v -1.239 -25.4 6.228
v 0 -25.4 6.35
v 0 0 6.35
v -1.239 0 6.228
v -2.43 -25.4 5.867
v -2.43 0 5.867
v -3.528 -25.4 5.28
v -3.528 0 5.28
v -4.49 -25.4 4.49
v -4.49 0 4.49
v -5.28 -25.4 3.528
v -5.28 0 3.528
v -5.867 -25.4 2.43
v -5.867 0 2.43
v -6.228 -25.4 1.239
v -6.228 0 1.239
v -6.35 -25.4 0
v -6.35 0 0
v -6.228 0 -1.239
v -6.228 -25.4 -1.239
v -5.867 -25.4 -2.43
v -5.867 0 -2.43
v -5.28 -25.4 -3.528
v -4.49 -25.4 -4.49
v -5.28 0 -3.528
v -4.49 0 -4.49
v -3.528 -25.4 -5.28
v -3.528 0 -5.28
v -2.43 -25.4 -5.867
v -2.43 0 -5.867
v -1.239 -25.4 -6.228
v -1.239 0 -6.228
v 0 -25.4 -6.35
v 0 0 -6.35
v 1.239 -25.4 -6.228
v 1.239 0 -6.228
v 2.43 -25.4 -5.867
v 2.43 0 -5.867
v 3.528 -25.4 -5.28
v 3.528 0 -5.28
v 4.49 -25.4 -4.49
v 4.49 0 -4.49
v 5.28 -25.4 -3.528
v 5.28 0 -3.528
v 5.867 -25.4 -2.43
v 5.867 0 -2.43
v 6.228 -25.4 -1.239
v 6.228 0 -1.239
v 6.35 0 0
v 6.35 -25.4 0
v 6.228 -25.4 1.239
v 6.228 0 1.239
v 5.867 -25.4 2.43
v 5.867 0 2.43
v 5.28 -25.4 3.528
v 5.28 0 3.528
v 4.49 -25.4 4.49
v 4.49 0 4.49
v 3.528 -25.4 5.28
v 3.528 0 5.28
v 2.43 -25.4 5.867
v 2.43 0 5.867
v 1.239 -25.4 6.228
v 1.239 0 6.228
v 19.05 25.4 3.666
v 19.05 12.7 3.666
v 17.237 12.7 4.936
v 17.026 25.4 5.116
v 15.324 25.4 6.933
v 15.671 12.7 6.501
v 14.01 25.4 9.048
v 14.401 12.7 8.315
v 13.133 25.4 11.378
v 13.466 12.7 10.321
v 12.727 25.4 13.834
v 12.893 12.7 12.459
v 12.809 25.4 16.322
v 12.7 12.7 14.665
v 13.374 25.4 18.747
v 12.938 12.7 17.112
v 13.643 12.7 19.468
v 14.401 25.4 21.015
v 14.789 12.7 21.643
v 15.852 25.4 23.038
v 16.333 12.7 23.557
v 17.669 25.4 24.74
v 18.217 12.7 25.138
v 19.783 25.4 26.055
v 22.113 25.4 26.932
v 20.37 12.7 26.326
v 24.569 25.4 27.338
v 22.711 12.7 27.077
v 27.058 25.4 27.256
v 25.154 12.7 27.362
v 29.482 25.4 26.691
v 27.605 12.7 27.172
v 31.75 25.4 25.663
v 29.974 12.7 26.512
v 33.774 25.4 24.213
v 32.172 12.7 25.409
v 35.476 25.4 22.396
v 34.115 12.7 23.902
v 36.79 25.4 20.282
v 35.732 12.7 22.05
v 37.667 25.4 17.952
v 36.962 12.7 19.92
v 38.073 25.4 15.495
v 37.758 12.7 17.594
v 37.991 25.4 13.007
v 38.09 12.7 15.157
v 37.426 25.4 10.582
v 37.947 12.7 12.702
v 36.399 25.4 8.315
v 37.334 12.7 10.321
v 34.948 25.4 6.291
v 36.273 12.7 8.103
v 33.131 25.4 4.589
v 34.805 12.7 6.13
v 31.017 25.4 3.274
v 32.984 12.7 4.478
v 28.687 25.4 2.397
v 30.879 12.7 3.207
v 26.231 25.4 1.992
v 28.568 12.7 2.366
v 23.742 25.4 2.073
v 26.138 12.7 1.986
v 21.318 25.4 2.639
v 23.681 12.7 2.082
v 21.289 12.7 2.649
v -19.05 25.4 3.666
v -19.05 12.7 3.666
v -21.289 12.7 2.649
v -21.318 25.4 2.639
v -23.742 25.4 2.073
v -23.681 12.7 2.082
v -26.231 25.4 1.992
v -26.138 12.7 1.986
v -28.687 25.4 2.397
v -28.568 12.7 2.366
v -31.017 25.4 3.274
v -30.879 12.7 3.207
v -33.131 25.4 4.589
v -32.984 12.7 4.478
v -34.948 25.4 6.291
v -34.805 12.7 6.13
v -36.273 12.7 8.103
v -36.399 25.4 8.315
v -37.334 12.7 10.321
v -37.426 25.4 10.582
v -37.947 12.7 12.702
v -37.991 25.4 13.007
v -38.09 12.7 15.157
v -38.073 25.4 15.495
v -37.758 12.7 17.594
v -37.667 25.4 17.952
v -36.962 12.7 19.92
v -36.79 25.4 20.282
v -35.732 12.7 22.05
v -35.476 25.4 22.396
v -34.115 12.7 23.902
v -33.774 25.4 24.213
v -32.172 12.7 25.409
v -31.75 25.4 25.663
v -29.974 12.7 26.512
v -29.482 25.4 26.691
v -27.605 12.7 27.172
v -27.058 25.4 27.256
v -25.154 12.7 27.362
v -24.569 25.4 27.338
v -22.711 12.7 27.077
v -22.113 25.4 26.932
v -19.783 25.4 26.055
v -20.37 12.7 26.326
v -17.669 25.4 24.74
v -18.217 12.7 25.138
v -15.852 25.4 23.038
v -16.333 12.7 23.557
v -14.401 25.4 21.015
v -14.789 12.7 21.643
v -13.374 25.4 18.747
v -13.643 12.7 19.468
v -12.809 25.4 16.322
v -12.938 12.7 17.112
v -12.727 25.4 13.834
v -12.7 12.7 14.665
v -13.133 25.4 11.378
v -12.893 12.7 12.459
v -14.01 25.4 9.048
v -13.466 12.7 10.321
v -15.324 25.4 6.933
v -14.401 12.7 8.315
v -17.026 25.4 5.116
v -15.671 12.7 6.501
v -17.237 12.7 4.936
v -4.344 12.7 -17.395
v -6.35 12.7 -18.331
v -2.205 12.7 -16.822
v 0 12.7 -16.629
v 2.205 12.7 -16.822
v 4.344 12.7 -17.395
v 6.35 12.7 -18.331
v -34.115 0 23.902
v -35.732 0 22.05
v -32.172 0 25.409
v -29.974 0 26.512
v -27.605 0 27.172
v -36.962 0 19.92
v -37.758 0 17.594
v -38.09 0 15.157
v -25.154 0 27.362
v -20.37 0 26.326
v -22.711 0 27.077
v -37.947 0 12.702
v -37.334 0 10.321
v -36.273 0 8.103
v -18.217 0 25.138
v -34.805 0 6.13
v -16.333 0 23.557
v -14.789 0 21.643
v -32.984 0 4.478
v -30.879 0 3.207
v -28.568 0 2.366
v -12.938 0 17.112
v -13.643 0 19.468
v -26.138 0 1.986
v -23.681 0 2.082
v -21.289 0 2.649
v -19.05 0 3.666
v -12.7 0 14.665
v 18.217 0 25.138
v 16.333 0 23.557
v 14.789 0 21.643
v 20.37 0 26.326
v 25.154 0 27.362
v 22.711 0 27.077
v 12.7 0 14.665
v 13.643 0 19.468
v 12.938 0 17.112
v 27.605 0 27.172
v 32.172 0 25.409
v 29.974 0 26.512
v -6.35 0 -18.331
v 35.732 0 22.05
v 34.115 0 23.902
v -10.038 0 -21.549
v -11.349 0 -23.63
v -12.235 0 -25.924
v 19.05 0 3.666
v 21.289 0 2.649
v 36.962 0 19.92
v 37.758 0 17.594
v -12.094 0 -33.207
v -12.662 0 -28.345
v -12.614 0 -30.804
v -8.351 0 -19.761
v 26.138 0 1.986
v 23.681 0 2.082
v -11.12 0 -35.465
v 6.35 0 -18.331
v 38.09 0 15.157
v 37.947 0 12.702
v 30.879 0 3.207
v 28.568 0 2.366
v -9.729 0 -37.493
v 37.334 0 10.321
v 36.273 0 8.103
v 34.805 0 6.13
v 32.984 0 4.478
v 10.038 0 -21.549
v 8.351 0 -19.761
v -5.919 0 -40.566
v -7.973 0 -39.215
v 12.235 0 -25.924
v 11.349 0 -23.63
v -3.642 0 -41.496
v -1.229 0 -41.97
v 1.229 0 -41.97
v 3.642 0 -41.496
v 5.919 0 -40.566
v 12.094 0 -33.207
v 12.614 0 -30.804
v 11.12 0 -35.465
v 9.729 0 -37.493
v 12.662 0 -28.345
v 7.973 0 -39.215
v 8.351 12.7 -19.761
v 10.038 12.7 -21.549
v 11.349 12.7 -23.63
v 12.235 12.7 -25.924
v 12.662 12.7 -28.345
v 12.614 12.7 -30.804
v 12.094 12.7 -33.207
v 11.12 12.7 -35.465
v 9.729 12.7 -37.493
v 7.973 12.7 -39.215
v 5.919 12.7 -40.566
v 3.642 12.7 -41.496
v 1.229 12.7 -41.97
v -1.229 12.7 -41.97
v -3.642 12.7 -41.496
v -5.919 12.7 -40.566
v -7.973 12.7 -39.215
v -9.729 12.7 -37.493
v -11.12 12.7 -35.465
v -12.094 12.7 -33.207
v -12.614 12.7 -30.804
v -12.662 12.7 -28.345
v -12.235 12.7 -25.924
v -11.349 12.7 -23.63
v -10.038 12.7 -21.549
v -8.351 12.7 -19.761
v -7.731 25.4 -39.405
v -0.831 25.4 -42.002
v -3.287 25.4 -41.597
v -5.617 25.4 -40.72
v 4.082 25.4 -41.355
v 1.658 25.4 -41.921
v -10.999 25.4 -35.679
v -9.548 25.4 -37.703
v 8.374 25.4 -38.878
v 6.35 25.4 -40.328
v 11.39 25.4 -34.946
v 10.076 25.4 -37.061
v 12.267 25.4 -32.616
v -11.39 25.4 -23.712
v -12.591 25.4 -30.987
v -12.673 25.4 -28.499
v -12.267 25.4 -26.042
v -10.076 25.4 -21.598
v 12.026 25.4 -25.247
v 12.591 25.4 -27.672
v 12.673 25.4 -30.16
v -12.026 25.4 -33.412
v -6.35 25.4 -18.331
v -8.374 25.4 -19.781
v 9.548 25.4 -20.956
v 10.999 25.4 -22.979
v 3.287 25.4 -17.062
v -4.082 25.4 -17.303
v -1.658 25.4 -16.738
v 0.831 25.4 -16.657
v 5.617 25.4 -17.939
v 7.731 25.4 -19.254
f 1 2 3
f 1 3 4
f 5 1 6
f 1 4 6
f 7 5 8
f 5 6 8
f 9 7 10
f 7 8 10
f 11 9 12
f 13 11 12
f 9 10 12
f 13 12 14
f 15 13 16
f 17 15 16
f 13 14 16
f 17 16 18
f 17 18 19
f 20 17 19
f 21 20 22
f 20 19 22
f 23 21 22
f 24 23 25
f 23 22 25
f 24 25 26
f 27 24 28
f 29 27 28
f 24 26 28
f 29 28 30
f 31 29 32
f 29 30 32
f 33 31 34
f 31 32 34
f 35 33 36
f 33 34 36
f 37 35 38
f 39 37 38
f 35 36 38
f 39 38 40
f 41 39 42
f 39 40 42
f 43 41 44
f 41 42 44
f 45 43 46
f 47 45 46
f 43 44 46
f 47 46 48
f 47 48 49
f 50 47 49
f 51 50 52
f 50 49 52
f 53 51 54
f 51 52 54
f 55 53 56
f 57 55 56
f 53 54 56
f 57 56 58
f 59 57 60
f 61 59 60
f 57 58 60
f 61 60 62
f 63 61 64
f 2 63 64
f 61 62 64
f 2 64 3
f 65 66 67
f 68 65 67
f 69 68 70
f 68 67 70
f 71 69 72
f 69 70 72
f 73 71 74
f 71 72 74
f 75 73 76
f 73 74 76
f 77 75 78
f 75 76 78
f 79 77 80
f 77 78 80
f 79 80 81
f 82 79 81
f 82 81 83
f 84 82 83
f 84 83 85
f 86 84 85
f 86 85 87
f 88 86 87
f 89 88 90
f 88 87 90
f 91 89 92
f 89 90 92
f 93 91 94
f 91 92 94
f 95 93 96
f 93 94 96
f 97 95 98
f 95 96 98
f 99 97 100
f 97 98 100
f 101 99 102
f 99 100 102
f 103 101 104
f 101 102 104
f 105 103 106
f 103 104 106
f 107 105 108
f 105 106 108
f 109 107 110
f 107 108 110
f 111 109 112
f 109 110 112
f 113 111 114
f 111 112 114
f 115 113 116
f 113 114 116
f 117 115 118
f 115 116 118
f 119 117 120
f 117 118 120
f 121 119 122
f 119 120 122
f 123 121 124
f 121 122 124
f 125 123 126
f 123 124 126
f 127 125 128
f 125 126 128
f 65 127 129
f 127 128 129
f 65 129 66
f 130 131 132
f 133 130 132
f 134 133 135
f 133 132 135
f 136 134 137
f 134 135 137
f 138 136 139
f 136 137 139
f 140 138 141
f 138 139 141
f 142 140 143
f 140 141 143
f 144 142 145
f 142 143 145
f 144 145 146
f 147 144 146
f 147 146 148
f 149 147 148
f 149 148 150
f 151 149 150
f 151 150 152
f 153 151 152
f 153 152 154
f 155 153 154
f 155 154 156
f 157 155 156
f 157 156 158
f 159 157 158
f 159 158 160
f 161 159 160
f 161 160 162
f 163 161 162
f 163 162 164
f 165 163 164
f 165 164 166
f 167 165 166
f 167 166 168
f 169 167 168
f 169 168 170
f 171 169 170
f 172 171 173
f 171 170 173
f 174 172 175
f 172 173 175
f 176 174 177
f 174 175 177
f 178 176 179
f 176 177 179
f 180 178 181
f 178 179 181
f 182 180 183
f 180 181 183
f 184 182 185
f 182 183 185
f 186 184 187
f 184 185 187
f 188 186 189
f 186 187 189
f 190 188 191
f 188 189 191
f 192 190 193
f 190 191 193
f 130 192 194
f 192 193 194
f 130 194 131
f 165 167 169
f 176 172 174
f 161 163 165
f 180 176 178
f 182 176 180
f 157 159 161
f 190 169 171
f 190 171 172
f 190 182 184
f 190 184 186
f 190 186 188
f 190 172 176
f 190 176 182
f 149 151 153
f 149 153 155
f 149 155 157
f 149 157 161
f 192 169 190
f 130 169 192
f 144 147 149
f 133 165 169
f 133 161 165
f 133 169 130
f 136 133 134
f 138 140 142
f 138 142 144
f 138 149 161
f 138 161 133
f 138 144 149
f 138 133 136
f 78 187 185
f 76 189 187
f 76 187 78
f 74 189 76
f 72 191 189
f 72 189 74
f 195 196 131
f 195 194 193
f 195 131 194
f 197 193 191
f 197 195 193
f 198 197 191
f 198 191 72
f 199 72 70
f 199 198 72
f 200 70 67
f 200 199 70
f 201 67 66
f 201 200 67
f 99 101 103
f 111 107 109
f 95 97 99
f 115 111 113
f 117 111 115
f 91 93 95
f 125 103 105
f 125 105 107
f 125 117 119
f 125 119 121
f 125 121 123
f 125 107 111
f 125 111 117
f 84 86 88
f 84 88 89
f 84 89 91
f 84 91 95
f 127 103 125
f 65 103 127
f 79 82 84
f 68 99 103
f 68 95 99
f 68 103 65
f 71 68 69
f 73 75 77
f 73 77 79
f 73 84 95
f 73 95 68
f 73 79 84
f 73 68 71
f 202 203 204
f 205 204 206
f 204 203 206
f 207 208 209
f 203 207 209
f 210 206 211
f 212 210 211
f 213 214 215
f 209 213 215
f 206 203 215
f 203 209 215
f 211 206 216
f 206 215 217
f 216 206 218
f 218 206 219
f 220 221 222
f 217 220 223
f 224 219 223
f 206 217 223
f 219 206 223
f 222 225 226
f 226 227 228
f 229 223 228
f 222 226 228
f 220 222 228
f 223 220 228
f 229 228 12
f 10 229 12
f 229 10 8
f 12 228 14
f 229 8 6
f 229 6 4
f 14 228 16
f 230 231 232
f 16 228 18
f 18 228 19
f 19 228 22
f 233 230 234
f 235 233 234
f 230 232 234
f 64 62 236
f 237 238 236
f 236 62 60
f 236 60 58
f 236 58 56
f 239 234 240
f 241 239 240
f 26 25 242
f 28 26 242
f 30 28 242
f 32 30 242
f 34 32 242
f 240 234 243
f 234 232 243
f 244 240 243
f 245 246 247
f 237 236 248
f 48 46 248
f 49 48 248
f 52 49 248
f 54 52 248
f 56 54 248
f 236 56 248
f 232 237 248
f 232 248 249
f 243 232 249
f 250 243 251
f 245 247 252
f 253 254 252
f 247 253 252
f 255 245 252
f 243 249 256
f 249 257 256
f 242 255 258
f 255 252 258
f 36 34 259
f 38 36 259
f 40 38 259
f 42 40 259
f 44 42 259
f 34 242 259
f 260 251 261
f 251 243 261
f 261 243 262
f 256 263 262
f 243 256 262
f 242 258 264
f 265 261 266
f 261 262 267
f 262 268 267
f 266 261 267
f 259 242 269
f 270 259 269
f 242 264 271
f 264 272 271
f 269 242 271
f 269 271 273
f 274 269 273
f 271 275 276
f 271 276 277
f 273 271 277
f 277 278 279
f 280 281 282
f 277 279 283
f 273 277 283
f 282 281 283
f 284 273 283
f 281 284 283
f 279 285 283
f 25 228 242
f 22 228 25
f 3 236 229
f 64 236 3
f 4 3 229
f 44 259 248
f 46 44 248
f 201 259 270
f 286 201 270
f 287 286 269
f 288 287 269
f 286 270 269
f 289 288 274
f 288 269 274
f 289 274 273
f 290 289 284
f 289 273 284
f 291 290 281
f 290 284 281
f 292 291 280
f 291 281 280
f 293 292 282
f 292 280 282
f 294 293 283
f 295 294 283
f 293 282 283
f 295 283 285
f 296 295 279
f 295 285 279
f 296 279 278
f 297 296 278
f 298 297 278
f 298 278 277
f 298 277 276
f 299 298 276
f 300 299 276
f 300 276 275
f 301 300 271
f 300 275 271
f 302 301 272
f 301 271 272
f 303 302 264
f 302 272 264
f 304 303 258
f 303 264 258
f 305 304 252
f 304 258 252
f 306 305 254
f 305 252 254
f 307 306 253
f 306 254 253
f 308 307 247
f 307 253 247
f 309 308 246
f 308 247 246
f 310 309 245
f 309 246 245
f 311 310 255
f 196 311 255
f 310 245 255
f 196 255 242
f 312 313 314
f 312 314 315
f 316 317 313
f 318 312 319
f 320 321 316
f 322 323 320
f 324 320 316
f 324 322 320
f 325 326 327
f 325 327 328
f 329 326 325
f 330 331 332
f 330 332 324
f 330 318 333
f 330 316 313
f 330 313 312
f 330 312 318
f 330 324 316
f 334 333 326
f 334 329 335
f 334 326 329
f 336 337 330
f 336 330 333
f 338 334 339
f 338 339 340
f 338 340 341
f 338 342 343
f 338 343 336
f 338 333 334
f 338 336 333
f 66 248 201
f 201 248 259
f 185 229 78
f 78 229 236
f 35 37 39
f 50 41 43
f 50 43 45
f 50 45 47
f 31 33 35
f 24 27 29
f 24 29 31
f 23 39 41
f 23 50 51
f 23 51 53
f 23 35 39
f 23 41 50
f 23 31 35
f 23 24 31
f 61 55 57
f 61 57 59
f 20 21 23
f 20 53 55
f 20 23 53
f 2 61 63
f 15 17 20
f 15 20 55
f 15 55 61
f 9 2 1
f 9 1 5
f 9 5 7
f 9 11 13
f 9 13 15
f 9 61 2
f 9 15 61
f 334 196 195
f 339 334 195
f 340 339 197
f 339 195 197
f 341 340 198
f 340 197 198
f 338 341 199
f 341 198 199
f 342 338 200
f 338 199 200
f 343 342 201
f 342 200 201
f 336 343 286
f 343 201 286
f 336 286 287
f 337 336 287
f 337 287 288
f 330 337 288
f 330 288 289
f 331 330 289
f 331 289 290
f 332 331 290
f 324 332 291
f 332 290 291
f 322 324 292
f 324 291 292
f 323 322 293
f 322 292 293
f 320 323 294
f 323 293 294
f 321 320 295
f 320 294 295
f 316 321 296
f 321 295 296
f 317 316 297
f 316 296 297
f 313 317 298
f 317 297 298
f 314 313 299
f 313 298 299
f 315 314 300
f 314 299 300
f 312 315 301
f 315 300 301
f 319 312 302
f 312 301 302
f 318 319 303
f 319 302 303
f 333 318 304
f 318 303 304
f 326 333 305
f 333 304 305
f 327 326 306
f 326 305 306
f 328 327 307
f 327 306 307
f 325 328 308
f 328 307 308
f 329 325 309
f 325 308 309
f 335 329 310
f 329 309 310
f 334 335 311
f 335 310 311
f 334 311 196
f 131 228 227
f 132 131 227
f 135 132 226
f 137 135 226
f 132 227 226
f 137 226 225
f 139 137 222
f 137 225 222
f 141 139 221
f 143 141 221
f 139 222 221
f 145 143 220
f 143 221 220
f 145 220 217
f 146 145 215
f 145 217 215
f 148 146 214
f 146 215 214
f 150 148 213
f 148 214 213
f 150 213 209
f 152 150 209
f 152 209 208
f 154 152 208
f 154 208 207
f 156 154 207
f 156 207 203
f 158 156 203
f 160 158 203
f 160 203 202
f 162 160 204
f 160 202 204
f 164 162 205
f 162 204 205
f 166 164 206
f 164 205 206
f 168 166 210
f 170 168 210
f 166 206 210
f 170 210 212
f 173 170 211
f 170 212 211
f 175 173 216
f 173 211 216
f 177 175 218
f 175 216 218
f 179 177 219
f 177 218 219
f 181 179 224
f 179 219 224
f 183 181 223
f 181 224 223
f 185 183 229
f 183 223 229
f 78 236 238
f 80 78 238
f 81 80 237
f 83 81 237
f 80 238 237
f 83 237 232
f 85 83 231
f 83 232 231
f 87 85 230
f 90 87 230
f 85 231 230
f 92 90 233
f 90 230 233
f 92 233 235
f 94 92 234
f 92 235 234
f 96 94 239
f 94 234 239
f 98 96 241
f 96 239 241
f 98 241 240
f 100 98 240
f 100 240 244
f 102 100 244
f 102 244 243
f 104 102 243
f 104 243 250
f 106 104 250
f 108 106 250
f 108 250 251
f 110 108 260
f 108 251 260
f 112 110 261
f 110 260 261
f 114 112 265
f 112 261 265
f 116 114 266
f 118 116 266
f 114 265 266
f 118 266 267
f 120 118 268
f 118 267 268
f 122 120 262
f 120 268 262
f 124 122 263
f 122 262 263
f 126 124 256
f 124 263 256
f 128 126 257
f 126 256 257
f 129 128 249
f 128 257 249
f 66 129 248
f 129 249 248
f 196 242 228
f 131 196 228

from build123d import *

# Parameters (mm, degrees)
BOSS_EXTRUDE1_DEPTH = 12.7
SKETCH2_R           = 12.7
BOSS_EXTRUDE2_DEPTH = 12.7
SKETCH3_R           = 6.35
BOSS_EXTRUDE3_DEPTH = 25.4


with BuildPart() as part:
    # Sketch1 → Boss-Extrude1 (new body)
    with BuildSketch(Plane(origin=(0, 0, 0), x_dir=(1, 0, 0), z_dir=(0, 1, 0))):
        with BuildLine():
            Line((-6.35, 18.330871047), (-19.05, -3.666174209))
            ThreePointArc((-19.05, -3.666174209), (-36.398522628, -21.014696837), (-12.7, -14.664696837))
            Line((-12.7, -14.664696837), (12.7, -14.664696837))
            ThreePointArc((12.7, -14.664696837), (36.398522628, -21.014696837), (19.05, -3.666174209))
            Line((19.05, -3.666174209), (6.35, 18.330871047))
            ThreePointArc((6.35, 18.330871047), (0, 42.029393675), (-6.35, 18.330871047))
        make_face()
    extrude(amount=BOSS_EXTRUDE1_DEPTH)

    # Sketch2 → Boss-Extrude2 (add)
    with BuildSketch(Plane(origin=(0, 12.7, 0), x_dir=(1, 0, 0), z_dir=(0, 1, 0))):
        with Locations(Location((-25.4, -14.664696837, 0), (0, 0, 60))):
            Circle(SKETCH2_R)
        with Locations(Location((25.4, -14.664696837, 0), (0, 0, 120))):
            Circle(SKETCH2_R)
        with Locations(Location((0, 29.329393675, 0), (0, 0, 240))):
            Circle(SKETCH2_R)
    extrude(amount=BOSS_EXTRUDE2_DEPTH)

    # Sketch3 → Boss-Extrude3 (add)
    with BuildSketch(Plane(origin=(0, 0, 0), x_dir=(-1, 0, 0), z_dir=(0, -1, 0))):
        with Locations(Location((0, 0, 0), (0, 0, 270))):
            Circle(SKETCH3_R)
    extrude(amount=BOSS_EXTRUDE3_DEPTH)


solid = part.part
